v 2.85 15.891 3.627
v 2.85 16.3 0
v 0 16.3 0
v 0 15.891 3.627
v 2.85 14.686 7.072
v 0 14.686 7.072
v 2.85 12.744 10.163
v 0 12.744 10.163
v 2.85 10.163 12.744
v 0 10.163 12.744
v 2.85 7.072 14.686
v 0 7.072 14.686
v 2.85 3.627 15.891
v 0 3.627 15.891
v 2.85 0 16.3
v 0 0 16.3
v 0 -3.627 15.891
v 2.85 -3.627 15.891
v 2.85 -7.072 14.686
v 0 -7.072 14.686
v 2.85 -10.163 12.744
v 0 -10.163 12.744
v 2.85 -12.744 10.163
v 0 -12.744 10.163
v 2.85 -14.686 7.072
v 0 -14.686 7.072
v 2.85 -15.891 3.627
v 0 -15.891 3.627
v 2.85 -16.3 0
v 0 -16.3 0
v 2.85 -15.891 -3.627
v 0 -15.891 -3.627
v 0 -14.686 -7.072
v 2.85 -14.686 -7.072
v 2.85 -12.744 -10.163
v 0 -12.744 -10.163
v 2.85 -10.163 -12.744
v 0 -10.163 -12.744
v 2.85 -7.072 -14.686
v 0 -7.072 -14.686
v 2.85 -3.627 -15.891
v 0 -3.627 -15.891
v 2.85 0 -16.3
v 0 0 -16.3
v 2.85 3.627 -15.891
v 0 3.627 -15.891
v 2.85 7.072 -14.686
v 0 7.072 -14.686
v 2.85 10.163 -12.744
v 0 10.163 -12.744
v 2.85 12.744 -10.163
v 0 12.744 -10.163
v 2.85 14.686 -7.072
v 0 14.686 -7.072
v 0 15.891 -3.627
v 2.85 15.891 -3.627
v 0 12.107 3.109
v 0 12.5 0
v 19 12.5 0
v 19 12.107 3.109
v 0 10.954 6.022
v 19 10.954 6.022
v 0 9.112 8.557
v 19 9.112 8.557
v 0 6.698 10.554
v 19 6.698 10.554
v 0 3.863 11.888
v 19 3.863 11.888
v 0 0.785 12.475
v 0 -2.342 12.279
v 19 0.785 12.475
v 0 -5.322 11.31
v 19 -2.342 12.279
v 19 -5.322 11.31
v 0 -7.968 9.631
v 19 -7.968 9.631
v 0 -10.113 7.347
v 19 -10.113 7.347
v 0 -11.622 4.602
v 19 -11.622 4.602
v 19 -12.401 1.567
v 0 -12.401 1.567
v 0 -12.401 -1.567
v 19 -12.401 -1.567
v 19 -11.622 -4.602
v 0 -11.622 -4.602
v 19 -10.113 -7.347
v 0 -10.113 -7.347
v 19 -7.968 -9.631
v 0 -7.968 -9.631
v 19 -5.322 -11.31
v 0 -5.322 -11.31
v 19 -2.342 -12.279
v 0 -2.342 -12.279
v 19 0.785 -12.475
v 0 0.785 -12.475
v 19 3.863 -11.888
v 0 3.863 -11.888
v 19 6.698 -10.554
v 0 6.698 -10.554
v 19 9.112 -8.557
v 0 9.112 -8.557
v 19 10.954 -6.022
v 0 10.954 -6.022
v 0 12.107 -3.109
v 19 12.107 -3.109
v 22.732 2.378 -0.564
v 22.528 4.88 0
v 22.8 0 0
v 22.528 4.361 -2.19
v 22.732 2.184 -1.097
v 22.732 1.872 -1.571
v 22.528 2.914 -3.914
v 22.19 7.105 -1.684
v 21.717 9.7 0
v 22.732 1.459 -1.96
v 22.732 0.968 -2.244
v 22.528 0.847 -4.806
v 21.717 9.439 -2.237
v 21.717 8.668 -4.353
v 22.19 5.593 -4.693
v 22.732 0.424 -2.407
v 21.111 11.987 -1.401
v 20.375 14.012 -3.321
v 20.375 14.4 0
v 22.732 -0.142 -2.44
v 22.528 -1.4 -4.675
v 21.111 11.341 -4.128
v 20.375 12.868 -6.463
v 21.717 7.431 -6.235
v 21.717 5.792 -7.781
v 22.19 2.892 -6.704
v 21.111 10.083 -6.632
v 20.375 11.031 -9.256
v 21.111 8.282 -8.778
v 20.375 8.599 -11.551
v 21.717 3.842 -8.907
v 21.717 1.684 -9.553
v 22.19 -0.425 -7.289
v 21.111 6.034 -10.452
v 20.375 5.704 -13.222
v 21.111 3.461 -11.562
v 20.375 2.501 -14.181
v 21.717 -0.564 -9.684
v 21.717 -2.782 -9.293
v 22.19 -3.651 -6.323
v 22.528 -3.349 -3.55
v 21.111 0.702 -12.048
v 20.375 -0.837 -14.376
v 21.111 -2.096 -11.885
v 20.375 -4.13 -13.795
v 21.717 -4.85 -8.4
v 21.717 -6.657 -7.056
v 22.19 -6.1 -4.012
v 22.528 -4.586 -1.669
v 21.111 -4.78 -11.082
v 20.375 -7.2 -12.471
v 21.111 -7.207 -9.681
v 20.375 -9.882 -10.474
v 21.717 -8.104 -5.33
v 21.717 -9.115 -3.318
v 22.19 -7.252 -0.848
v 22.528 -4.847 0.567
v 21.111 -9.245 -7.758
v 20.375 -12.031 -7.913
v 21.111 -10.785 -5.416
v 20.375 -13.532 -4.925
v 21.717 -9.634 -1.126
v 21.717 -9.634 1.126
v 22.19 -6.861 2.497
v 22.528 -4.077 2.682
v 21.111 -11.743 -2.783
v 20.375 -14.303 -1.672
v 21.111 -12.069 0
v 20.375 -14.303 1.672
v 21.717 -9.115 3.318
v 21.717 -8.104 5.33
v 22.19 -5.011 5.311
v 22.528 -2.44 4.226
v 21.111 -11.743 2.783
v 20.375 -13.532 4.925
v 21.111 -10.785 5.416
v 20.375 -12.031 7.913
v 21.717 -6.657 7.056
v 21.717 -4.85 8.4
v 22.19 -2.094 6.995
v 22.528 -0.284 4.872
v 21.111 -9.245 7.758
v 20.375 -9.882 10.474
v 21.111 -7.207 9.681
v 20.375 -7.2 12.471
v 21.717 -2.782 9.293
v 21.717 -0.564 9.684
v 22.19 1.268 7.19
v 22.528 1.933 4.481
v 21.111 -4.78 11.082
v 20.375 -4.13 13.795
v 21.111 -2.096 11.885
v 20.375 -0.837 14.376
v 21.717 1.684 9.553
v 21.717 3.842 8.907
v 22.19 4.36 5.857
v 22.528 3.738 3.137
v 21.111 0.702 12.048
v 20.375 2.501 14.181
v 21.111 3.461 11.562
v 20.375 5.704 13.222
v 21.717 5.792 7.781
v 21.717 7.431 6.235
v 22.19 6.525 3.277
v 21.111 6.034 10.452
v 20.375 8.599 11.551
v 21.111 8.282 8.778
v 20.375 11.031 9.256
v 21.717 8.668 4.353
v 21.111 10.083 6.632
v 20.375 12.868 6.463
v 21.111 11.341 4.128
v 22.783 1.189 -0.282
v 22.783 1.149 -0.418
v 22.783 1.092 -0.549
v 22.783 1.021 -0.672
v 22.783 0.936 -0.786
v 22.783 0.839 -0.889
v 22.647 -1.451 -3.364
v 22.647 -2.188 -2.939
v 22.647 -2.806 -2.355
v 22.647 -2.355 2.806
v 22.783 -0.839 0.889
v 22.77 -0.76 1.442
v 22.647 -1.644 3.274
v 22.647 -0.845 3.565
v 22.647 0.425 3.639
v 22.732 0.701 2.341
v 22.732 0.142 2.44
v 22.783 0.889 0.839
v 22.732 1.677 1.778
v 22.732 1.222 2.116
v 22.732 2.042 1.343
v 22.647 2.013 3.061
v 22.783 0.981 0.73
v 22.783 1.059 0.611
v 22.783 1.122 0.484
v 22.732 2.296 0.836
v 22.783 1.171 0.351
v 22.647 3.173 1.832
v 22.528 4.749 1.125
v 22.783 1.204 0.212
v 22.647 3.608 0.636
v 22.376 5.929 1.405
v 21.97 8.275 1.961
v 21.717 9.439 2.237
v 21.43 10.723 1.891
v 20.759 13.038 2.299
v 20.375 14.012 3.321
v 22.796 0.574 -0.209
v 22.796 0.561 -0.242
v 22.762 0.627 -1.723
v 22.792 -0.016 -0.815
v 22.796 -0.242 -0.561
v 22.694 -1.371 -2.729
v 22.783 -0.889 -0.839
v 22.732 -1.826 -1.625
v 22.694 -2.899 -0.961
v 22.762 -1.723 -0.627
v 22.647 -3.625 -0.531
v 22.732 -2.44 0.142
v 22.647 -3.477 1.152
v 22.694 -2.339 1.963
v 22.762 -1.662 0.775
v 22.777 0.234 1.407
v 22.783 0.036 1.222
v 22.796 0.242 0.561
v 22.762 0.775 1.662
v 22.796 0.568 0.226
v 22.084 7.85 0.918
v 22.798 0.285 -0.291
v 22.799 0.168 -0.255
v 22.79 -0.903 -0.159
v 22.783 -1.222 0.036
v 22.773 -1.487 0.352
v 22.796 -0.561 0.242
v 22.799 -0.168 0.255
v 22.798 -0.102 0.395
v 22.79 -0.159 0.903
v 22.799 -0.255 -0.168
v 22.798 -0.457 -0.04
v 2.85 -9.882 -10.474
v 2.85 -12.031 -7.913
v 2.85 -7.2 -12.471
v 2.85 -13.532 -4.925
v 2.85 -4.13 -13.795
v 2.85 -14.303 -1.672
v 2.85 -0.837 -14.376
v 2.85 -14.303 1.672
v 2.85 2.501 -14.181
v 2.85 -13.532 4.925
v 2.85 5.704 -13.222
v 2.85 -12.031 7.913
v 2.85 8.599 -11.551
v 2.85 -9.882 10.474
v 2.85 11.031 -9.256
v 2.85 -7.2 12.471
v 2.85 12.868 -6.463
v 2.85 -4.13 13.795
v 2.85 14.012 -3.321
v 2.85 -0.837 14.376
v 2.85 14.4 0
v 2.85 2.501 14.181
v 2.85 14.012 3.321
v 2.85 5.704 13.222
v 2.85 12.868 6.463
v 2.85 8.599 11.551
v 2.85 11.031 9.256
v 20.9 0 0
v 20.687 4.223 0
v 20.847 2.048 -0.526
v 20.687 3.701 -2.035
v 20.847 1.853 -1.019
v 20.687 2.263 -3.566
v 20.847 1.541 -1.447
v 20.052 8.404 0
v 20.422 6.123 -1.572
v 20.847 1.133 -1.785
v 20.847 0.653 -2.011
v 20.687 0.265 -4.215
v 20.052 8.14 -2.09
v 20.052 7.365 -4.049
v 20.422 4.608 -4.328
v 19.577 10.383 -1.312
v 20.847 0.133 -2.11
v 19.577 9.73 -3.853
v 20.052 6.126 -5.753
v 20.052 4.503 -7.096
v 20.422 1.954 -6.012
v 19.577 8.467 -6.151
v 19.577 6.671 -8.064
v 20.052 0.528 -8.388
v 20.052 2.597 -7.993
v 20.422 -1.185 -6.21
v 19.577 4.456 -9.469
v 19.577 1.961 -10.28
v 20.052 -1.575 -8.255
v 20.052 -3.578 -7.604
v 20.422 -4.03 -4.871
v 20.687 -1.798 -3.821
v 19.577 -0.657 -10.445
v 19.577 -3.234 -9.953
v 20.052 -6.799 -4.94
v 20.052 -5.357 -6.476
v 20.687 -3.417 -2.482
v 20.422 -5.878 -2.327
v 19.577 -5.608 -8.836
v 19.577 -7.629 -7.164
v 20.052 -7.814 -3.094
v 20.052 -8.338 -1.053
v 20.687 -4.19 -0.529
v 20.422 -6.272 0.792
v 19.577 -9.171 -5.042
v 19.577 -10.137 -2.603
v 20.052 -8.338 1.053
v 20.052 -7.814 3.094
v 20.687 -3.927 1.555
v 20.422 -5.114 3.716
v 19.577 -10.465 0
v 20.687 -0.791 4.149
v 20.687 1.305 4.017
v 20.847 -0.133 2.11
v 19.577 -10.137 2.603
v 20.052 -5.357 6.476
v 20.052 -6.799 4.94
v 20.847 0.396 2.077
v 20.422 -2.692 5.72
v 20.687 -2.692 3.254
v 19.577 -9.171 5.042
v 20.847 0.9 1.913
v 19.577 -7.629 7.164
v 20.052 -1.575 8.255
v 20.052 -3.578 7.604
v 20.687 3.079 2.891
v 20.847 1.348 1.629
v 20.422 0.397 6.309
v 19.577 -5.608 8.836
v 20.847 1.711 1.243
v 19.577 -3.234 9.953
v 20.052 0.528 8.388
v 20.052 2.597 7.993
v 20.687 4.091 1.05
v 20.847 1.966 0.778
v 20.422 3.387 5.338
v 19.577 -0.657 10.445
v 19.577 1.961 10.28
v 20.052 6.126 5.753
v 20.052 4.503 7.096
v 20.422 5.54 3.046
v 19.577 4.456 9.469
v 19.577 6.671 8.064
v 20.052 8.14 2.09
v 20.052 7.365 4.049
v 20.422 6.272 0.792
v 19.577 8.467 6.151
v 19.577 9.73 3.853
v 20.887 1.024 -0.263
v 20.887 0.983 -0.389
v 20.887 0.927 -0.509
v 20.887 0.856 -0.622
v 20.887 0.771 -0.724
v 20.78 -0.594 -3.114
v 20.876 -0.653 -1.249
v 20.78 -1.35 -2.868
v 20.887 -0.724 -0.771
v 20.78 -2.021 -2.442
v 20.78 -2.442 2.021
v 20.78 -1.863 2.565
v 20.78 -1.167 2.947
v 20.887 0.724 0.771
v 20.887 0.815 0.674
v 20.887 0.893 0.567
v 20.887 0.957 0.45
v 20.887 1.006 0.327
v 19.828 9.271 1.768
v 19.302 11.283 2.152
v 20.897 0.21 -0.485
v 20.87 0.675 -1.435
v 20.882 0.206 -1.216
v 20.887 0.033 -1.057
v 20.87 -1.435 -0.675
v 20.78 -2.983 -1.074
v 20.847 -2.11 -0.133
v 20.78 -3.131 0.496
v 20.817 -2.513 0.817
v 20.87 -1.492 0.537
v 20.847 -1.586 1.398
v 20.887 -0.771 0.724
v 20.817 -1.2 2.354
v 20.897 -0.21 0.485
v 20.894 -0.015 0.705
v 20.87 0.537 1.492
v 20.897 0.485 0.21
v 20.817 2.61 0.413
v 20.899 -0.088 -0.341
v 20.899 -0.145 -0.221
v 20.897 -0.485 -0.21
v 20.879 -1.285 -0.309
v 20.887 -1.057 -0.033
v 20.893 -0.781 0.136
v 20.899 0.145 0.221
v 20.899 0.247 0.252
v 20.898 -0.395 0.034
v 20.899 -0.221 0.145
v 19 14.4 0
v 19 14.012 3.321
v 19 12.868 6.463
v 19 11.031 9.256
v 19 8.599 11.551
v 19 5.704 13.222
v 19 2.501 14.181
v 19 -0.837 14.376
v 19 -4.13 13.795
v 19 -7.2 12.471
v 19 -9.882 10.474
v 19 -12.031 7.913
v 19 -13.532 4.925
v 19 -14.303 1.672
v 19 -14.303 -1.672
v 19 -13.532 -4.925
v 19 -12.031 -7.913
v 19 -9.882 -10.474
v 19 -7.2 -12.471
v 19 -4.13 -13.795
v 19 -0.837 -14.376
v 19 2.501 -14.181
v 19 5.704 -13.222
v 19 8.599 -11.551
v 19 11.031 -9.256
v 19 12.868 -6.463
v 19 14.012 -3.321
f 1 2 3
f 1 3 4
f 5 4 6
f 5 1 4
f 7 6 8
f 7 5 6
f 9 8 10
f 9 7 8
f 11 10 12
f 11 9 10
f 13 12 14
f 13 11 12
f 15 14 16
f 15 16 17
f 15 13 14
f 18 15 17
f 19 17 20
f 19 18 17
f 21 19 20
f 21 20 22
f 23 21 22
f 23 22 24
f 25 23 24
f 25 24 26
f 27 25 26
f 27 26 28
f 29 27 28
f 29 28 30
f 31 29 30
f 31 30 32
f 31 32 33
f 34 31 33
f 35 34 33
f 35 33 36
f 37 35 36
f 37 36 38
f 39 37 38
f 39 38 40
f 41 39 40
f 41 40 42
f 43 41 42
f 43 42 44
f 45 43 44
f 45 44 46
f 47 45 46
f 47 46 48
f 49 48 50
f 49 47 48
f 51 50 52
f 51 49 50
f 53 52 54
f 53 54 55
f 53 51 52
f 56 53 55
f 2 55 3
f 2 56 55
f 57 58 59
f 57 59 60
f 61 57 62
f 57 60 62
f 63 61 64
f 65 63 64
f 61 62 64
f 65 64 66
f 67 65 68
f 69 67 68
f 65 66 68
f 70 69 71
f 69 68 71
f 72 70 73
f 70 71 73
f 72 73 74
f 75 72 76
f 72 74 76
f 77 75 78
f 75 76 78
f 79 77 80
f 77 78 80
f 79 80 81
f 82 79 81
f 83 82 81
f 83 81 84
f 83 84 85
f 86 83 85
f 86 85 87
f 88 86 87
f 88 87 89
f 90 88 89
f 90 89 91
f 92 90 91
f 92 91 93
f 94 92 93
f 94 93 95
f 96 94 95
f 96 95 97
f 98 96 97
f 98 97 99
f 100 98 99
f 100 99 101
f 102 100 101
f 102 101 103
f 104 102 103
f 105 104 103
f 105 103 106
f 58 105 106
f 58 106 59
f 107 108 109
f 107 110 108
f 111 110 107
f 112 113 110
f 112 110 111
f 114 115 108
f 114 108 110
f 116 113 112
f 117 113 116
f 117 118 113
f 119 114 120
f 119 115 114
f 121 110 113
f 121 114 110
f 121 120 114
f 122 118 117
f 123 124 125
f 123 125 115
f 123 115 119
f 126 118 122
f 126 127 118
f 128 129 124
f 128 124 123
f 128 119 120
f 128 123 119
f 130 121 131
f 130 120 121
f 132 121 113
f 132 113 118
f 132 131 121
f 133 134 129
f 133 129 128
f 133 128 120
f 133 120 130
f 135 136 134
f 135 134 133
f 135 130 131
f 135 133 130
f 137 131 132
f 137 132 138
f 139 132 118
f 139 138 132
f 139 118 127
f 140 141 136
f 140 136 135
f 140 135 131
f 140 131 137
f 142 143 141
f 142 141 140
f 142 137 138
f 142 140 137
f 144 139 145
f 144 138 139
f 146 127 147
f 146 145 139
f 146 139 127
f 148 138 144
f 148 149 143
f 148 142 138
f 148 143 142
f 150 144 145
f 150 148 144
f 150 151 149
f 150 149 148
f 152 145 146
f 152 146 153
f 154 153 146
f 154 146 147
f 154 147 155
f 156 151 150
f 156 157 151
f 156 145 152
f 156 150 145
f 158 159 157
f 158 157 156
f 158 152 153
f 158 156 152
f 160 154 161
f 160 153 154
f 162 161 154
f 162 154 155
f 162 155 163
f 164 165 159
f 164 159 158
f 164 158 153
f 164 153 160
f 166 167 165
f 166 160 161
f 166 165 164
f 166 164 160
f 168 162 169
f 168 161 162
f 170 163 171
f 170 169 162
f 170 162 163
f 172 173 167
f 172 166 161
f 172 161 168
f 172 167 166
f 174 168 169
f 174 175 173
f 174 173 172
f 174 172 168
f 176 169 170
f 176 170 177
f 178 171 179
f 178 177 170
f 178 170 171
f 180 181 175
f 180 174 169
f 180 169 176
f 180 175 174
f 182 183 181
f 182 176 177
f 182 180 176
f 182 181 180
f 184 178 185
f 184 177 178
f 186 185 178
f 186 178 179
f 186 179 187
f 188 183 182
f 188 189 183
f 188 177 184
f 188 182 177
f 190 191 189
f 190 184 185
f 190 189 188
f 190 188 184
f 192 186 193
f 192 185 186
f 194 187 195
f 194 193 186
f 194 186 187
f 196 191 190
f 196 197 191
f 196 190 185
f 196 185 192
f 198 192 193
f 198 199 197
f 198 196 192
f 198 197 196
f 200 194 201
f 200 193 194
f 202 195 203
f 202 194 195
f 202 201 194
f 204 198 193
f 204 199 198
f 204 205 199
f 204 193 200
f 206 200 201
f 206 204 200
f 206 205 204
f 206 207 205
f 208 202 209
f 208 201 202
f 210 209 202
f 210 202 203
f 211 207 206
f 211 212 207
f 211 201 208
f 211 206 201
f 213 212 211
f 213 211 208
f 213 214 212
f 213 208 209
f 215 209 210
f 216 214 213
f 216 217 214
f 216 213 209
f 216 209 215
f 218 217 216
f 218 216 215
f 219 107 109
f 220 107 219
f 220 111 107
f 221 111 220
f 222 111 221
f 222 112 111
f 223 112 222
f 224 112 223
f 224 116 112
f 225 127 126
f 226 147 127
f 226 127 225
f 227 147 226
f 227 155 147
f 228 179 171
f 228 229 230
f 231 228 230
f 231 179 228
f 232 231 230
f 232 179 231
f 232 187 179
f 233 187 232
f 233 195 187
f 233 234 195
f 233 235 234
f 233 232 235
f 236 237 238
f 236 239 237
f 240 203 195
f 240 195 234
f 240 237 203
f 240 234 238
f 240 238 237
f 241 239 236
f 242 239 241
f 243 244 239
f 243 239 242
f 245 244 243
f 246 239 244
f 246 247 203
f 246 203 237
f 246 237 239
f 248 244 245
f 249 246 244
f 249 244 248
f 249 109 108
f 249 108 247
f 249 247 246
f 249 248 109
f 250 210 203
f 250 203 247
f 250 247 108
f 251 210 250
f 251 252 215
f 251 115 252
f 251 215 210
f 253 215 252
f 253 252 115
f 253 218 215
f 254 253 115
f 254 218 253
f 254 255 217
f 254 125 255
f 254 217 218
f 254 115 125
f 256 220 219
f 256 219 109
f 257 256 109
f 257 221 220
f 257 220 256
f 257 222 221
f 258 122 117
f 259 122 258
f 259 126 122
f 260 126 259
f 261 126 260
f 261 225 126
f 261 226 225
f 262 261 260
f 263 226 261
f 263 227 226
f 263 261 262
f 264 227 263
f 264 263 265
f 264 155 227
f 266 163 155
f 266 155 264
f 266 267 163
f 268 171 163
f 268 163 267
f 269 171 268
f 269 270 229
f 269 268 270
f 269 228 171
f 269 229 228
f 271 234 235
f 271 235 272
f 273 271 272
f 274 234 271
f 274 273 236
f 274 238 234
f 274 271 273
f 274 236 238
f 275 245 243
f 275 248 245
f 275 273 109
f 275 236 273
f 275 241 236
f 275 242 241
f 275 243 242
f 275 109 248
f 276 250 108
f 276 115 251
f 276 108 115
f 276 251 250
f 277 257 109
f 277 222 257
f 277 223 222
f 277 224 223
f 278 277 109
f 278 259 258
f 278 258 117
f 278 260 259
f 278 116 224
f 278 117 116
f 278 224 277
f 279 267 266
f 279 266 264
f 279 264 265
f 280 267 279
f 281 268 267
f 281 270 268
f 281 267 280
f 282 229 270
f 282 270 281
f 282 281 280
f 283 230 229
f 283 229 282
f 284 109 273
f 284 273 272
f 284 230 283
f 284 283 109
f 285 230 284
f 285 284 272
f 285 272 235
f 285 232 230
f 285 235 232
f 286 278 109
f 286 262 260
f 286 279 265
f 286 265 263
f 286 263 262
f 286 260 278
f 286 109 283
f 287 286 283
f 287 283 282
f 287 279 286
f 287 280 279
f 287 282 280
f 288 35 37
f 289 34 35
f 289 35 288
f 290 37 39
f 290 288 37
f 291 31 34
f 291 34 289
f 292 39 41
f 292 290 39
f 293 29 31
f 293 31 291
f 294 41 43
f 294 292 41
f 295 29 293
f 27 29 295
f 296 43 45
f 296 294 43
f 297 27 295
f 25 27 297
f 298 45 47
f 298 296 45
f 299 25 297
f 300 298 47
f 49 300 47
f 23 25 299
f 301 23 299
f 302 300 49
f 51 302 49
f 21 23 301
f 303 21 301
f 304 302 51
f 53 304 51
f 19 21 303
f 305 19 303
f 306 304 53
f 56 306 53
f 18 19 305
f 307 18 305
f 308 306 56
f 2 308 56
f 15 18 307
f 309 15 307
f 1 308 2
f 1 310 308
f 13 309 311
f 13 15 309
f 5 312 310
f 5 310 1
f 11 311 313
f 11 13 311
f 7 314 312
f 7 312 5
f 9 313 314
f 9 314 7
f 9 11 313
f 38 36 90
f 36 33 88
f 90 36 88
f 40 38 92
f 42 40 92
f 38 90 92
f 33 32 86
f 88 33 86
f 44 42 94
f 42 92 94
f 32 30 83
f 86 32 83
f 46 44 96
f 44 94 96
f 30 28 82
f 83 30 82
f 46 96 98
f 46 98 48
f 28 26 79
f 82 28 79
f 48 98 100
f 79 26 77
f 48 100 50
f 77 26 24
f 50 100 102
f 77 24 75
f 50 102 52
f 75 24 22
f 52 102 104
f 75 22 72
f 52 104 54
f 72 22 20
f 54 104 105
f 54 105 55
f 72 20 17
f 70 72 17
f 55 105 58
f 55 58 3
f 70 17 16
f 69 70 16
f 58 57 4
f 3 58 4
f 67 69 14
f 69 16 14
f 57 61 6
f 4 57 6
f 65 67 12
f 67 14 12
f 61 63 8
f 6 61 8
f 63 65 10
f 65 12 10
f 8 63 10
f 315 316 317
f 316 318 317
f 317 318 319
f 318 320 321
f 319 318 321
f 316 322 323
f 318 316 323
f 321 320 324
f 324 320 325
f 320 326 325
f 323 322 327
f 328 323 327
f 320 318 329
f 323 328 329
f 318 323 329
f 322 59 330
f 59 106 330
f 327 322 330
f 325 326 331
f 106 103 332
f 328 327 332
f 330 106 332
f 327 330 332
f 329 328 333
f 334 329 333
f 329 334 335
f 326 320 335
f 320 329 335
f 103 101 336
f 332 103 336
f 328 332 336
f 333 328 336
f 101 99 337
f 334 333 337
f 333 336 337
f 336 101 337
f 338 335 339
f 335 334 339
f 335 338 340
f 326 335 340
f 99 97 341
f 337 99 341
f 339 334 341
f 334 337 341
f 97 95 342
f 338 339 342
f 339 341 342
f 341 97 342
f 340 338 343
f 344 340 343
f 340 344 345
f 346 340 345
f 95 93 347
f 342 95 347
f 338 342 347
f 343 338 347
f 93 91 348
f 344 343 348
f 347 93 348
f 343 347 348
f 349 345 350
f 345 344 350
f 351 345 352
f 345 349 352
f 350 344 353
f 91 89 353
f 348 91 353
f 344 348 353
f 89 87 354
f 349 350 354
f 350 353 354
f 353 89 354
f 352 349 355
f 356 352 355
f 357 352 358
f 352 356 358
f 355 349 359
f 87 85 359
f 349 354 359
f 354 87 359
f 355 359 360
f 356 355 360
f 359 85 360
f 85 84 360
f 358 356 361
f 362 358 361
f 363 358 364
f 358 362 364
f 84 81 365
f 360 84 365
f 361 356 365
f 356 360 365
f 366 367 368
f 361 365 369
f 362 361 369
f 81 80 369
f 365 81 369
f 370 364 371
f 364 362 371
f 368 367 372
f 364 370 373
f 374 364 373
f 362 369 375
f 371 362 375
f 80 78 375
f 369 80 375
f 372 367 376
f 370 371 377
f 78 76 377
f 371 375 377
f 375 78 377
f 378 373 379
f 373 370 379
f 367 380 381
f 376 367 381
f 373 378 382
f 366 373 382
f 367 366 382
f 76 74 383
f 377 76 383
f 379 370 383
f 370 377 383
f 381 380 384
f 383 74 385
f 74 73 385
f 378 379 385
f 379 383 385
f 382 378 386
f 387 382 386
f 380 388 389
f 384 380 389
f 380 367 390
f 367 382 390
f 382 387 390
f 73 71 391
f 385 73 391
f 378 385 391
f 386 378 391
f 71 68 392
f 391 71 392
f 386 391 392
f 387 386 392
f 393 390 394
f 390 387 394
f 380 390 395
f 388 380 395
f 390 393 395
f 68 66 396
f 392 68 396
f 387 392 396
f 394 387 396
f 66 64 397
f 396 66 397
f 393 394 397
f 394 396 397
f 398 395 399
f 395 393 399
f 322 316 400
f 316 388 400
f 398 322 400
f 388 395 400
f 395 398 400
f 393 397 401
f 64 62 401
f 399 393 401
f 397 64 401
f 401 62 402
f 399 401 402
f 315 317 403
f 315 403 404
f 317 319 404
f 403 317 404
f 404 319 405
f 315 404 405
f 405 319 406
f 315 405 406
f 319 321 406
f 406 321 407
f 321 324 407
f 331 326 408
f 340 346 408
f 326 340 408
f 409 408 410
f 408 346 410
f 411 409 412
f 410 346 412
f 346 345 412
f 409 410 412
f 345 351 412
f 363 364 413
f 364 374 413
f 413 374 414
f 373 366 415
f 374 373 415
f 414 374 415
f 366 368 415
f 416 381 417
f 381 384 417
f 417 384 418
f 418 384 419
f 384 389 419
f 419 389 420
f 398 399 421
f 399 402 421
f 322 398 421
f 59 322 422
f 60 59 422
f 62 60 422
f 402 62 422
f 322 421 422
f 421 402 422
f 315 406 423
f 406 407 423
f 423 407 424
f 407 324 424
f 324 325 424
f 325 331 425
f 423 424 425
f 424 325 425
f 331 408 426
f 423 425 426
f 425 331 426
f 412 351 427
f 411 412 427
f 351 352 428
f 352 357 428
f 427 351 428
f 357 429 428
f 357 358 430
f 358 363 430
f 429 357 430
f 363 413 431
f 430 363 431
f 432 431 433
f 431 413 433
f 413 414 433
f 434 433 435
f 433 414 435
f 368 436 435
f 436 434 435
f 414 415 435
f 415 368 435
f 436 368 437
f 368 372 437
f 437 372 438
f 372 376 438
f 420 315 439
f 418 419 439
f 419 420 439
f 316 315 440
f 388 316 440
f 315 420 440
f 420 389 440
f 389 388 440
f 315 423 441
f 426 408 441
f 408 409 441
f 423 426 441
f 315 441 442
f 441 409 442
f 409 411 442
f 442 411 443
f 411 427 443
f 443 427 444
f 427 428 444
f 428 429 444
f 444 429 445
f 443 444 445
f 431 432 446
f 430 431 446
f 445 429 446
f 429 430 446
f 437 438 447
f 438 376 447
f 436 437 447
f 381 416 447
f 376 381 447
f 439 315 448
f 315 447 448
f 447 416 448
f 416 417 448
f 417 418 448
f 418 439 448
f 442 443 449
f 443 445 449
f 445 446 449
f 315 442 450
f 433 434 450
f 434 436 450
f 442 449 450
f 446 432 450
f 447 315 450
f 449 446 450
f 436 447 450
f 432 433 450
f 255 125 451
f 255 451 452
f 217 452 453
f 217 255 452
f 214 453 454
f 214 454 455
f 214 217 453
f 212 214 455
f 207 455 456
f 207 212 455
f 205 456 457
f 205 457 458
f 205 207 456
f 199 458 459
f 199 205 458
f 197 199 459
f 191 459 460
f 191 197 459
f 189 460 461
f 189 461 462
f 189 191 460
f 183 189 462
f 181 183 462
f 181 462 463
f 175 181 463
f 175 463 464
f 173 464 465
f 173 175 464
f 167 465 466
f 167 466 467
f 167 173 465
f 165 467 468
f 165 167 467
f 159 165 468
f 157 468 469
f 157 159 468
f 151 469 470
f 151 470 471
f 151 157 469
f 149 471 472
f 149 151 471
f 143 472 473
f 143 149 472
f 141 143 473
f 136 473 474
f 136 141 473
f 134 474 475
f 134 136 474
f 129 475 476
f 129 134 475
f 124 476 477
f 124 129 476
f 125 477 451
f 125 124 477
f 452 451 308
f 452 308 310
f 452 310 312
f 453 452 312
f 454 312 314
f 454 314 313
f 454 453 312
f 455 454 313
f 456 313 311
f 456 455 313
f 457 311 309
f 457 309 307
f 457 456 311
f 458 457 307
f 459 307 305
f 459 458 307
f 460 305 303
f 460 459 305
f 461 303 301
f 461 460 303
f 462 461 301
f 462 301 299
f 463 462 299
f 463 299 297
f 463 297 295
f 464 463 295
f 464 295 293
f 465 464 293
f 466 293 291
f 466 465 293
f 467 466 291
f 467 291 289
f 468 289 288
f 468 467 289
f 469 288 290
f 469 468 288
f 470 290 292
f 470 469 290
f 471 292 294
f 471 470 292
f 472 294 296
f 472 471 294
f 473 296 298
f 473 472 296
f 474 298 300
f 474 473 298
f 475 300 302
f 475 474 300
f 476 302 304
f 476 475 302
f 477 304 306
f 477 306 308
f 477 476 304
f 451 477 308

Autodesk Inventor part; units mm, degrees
ref_plane "YZ Plane" through (0, 0, 0) normal (1, 0, 0) x (0, 1, 0)
ref_plane "XZ Plane" through (0, 0, 0) normal (0, 1, 0) x (-1, 0, 0)
ref_plane "XY Plane" through (0, 0, 0) normal (0, 0, 1) x (1, 0, 0)
sketch "Sketch1" plane through (0, 0, 0) normal (0, 0, 1) x (1, 0, 0)
  line L0 (0, 0) -> (19, 0)
  line L1 (0, 0) -> (0, 12.5) construction
  line L2 (0, 12.5) -> (0, 16.3)
  line L3 (0, 16.3) -> (2.85, 16.3)
  line L4 (2.85, 16.3) -> (2.85, 14.4)
  line L5 (2.85, 14.4) -> (19, 14.4)
  line L6 (0, 12.5) -> (19, 12.5)
  line L7 (19, 14.4) -> (19, 0) construction
  line L8 (19, 14.4) -> (22.8, 14.4) construction
  line L9 (22.8, 14.4) -> (22.8, 0) construction
  line L10 (22.8, 0) -> (19, 0) construction
  line L11 (20.9, 14.4) -> (20.9, 0) construction
  line L12 (19, -14.4) -> (19, 0) construction
  line L13 (19, -14.4) -> (22.8, -14.4) construction
  line L14 (22.8, -14.4) -> (22.8, 0) construction
  line L15 (20.9, -14.4) -> (20.9, 0) construction
  line L16 (20.9, 0) -> (19, 0) construction
  line L17 (19, 12.5) -> (19, 14.4)
  arc A0 (20.9, 0) -> (19, 12.5) centre (-21.1684, 0) ccw
  line L18 (19, 14.4) -> (20.3751, 14.4)
  line L19 (20.9, 0) -> (22.8, 0)
  arc A1 (22.8, 0) -> (20.3751, 14.4) centre (-21.1684, 0) ccw
  dimension "d0" = 2.85
  dimension "d2" = 1.9
  dimension "d3" = 1.9
  dimension "d4" = 25
  dimension "d5" = 19
  dimension "d6" = 3.8
revolve "Revolve1" add sketch "Sketch1" angle 360 about axis through (0, 0, 0) along (1, 0, 0) contours L2 L3 L4 L5 L17 L6
revolve "Revolve2" add sketch "Sketch1" angle 360 about axis through (20.9, 0, 0) along (-1, 0, 0) contours L17 L18 A1 L19 A0
equation "\"d0\" = 1.5 * s1"
equation "\"d2\" = s1"
equation "\"d3\" = s1"
equation "\"d4\" = d1"
equation "\"d5\" = t1"
equation "\"d6\" = 2 * s1"
equation "\"d1\" = 25"
equation "\"t1\" = 19"
equation "\"s1\" = 1.9"
properties part number "DIN 8063 Cap Type K 25" material "PVC, Unplasticized"
